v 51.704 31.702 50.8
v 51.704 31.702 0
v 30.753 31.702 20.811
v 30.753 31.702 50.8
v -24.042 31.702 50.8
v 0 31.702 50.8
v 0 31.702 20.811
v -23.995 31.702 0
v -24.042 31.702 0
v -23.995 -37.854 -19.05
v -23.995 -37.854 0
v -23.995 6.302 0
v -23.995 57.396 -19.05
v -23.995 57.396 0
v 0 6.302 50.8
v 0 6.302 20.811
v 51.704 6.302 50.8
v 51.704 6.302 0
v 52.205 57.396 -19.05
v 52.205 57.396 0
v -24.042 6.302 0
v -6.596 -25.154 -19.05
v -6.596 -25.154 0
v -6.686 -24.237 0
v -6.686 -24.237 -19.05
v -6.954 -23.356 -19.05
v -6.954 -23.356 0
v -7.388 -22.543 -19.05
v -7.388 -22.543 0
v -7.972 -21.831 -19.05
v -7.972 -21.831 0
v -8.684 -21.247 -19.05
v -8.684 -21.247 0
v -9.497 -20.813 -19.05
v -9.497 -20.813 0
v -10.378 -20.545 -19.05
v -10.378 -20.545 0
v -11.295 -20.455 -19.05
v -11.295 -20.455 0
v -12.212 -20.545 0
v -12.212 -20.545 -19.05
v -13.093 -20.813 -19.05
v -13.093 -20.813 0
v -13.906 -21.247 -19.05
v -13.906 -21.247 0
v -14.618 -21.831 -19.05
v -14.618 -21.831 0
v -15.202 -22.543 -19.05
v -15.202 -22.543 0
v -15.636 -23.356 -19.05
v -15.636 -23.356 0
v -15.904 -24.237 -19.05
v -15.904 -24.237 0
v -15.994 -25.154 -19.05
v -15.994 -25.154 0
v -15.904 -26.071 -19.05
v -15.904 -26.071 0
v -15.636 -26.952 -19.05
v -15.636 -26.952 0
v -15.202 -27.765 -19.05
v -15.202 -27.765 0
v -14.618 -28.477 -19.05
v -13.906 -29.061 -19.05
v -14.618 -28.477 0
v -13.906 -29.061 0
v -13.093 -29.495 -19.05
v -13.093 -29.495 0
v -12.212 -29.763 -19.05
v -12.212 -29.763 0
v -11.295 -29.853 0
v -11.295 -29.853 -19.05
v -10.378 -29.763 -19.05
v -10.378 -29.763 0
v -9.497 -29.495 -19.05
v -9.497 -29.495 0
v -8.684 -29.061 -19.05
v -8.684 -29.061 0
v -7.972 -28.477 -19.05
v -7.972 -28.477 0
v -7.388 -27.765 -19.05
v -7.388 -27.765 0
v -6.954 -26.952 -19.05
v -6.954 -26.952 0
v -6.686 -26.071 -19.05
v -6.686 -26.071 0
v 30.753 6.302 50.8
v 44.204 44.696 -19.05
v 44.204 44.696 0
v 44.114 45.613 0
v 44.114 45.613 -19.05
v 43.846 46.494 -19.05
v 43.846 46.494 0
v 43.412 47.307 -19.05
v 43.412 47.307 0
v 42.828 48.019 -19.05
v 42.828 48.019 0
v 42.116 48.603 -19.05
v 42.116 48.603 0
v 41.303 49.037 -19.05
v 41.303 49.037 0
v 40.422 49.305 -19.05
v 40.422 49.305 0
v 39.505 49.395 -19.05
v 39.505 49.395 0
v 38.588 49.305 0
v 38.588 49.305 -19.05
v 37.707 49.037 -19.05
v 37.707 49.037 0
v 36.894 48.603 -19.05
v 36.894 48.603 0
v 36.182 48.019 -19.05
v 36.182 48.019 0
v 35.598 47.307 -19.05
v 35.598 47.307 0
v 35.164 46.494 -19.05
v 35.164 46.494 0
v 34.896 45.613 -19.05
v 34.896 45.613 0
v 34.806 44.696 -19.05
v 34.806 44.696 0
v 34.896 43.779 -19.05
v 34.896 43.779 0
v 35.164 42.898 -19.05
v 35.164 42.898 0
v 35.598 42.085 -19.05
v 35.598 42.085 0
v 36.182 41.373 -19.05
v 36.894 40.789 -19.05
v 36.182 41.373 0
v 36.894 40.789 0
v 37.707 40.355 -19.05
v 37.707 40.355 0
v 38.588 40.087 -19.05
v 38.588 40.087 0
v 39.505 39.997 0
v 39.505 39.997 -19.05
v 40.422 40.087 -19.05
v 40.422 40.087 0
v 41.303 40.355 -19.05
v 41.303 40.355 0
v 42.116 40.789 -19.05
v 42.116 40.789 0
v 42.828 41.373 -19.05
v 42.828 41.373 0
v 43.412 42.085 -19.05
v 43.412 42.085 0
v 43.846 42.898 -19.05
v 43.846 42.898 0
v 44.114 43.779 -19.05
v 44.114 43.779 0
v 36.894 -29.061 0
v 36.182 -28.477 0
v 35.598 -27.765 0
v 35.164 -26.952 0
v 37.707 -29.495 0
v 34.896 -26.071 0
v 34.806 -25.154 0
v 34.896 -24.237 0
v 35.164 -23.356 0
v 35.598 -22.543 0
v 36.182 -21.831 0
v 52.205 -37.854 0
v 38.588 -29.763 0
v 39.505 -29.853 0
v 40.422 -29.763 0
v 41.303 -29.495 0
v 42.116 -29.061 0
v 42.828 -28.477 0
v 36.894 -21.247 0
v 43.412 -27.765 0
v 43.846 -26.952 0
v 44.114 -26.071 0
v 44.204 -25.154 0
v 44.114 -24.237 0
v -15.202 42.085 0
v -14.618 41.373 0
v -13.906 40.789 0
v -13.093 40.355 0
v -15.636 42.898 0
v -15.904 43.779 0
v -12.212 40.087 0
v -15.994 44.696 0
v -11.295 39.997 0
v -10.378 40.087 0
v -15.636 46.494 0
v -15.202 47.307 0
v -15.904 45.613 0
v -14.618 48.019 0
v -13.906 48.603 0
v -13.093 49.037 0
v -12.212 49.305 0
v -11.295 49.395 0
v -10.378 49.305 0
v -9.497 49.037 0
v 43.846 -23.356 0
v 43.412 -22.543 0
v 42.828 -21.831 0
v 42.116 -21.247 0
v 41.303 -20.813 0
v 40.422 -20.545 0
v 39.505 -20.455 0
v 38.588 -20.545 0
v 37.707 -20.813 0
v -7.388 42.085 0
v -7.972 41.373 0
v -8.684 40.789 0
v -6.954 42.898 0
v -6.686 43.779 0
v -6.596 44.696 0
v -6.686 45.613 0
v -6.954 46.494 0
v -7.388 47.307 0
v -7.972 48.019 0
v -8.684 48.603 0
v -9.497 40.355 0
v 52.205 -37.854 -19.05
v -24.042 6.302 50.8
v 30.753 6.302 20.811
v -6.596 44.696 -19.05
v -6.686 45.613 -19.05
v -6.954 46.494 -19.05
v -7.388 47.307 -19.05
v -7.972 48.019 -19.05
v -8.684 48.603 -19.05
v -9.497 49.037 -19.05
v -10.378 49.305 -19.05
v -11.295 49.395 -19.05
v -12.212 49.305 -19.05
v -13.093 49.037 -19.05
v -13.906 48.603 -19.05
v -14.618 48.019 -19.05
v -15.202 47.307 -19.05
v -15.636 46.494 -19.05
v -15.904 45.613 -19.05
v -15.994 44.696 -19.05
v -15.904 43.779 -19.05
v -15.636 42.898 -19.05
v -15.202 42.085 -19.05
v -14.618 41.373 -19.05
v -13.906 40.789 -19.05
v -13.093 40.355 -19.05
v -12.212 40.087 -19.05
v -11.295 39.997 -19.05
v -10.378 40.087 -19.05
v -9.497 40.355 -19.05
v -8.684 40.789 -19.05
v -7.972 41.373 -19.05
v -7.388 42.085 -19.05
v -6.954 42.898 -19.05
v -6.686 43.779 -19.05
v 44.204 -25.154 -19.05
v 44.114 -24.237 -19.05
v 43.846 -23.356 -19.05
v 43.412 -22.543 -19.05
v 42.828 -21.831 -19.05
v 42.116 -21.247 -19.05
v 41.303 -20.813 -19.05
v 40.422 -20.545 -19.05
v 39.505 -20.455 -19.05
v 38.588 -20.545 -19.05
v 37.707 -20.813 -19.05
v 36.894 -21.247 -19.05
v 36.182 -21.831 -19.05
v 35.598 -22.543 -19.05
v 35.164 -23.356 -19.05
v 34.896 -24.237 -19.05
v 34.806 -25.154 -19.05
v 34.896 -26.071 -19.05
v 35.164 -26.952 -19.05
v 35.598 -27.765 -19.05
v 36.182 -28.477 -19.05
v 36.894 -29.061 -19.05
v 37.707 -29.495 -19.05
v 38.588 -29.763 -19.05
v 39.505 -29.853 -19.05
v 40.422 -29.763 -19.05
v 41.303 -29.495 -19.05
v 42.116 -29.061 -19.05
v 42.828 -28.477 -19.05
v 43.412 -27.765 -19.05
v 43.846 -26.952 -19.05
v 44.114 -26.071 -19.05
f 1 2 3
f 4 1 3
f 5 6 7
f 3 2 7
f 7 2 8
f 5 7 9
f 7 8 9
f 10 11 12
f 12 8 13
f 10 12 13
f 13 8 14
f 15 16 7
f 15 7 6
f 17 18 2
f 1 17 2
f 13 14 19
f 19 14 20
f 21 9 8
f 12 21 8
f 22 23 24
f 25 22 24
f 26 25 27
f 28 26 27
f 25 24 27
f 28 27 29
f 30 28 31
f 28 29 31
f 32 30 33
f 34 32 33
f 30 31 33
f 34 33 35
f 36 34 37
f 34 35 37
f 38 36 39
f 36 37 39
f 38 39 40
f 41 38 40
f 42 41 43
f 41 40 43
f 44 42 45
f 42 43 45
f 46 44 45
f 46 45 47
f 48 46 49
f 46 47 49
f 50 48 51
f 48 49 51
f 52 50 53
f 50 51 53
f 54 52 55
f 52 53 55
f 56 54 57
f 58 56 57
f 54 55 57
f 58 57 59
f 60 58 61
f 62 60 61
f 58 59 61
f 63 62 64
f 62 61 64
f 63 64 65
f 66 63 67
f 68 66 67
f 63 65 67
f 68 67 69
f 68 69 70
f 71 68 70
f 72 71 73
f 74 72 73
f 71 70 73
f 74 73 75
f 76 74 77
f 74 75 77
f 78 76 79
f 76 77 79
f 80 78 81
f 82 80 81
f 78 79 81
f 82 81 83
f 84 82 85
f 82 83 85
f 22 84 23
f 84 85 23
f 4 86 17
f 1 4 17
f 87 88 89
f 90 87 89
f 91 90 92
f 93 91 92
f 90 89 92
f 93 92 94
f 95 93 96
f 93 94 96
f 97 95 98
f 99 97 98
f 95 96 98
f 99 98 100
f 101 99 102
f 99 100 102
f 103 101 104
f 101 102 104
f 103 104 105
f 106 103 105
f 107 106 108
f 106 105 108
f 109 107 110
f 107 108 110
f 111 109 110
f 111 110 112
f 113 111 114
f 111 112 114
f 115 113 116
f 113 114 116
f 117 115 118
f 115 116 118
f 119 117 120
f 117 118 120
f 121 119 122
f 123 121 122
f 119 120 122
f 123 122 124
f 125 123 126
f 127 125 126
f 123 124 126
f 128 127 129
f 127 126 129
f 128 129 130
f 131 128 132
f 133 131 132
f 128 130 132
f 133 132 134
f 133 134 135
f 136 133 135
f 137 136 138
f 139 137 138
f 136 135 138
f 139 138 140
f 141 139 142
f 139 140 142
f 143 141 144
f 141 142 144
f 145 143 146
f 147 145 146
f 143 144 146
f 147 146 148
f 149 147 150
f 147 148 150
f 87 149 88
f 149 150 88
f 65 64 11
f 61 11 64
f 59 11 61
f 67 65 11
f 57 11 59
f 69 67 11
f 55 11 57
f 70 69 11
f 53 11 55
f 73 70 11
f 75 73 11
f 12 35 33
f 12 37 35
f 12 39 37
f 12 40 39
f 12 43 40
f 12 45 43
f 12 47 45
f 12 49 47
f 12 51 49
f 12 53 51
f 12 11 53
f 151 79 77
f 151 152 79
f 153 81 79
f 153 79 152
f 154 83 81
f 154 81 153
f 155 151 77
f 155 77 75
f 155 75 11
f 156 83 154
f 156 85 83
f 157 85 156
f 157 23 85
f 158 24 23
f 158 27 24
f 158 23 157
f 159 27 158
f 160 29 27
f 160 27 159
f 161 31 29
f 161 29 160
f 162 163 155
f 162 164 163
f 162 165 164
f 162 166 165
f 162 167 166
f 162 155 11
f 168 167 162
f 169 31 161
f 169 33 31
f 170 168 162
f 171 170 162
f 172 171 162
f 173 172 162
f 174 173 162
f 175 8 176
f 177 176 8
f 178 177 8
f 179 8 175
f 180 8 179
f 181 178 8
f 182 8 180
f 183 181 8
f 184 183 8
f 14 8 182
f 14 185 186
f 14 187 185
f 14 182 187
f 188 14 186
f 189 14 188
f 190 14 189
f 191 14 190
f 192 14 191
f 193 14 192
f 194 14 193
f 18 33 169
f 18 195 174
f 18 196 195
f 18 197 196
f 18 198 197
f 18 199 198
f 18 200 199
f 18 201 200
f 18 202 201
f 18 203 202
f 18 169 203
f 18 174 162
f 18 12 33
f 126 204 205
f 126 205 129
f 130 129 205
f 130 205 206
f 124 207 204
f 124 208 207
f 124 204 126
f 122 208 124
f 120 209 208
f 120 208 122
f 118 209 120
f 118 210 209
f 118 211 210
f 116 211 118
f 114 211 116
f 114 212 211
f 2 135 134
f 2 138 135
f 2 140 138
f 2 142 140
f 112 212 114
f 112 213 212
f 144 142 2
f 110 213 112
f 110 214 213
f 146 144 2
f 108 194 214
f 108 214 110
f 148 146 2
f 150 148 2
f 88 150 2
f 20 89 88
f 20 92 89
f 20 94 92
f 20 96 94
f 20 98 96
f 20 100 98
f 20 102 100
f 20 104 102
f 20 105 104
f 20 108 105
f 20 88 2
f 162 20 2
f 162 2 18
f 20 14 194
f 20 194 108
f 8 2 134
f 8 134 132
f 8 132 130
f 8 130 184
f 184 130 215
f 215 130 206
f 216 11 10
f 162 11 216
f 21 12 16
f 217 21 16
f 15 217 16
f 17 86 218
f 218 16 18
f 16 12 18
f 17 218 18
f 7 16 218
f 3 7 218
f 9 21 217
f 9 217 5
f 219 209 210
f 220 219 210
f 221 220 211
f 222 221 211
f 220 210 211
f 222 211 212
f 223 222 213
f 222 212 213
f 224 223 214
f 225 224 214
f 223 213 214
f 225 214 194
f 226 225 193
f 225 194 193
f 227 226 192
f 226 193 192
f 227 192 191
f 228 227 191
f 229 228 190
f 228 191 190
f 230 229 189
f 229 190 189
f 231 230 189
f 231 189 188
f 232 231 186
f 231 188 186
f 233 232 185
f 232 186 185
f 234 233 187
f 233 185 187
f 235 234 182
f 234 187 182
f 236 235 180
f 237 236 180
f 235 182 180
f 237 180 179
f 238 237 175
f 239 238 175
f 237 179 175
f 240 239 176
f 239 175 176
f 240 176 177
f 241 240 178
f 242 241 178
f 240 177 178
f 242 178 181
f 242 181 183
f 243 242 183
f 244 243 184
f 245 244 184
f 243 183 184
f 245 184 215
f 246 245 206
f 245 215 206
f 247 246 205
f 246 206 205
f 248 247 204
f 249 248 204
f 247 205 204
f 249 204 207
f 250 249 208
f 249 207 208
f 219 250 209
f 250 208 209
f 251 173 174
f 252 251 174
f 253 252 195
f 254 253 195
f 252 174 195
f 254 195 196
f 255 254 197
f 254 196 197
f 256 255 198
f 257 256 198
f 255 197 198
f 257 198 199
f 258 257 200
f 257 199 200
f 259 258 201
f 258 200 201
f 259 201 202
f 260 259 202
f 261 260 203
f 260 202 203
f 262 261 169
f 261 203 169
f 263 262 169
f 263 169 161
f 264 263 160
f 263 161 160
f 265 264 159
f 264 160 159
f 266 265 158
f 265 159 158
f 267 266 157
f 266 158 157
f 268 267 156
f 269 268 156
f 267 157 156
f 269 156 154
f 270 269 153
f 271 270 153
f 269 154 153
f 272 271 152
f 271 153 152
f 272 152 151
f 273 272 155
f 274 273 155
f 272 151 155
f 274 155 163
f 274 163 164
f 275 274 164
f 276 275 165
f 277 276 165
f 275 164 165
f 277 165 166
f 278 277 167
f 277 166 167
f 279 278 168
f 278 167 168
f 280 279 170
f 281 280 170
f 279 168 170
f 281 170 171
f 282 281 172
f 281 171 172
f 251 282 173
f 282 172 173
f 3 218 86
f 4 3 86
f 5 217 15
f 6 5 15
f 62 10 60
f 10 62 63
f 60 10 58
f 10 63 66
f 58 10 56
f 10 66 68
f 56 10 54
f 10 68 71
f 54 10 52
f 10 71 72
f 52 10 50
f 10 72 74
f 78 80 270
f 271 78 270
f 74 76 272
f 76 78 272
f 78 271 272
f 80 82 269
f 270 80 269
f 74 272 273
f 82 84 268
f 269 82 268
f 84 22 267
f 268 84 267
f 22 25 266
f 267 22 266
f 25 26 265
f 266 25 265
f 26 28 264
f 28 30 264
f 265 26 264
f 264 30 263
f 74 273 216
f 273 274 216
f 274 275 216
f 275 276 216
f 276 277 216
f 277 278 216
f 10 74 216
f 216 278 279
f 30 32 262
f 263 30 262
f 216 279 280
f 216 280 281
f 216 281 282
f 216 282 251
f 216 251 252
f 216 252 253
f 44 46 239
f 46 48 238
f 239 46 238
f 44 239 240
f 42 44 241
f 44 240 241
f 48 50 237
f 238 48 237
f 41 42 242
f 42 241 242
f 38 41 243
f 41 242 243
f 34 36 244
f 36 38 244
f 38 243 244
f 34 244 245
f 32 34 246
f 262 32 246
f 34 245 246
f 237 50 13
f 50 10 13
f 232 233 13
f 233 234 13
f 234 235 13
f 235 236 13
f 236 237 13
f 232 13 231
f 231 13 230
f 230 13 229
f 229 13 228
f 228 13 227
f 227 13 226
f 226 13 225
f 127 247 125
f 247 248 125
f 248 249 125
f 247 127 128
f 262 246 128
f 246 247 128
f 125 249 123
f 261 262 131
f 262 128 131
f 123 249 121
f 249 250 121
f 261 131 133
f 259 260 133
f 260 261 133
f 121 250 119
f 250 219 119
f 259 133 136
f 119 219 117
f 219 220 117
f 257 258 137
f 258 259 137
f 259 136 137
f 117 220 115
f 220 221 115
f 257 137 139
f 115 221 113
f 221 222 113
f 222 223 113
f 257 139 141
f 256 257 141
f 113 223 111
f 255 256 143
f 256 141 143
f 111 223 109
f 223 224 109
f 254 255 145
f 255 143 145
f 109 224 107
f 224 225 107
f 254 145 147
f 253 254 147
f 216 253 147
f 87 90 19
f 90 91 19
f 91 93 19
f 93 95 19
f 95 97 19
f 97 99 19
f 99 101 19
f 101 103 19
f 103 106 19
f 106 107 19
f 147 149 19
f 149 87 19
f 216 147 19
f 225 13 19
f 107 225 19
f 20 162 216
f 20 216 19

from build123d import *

# Parameters (mm, degrees)
F2_W     = 0.0470026281
F2_H     = 25.4
F2_W_2   = 75.699427795
F3_DEPTH = 50.8
F1_W     = 76.2
F1_H     = 95.25
F1_R     = 4.699
F4_DEPTH = 19.05
F5_W     = 30.7534076273
F5_H     = 29.9894312948
F6_DEPTH = 31.75


with BuildPart() as f3:
    # F2 (on face) → F3 (new body)
    with BuildSketch(Plane.XY):
        with Locations((-24.0185575915, 19.0019719303)):
            Rectangle(F2_W, F2_H)
        with Locations((13.85465762, 19.0019719303)):
            Rectangle(F2_W_2, F2_H)
    extrude(amount=F3_DEPTH)

    # F1 (on face) → F4 (join)
    with BuildSketch(Plane.XY):
        with Locations((14.1049437225, 9.770923992)):
            Rectangle(F1_W, F1_H)
        with Locations((-11.2950562775, -25.154076008)):
            Circle(F1_R, mode=Mode.SUBTRACT)
        with Locations((39.5049437225, -25.154076008)):
            Circle(F1_R, mode=Mode.SUBTRACT)
        with Locations((-11.2950562775, 44.695923992)):
            Circle(F1_R, mode=Mode.SUBTRACT)
        with Locations((39.5049437225, 44.695923992)):
            Circle(F1_R, mode=Mode.SUBTRACT)
    extrude(amount=-F4_DEPTH)

    # F5 (on face) → F6 (cut)
    with BuildSketch(Plane.XZ.offset(-6.3019719303)):
        with Locations((15.3767038137, 35.8052843526)):
            Rectangle(F5_W, F5_H)
    extrude(amount=-F6_DEPTH, mode=Mode.SUBTRACT)


solid = f3.part
